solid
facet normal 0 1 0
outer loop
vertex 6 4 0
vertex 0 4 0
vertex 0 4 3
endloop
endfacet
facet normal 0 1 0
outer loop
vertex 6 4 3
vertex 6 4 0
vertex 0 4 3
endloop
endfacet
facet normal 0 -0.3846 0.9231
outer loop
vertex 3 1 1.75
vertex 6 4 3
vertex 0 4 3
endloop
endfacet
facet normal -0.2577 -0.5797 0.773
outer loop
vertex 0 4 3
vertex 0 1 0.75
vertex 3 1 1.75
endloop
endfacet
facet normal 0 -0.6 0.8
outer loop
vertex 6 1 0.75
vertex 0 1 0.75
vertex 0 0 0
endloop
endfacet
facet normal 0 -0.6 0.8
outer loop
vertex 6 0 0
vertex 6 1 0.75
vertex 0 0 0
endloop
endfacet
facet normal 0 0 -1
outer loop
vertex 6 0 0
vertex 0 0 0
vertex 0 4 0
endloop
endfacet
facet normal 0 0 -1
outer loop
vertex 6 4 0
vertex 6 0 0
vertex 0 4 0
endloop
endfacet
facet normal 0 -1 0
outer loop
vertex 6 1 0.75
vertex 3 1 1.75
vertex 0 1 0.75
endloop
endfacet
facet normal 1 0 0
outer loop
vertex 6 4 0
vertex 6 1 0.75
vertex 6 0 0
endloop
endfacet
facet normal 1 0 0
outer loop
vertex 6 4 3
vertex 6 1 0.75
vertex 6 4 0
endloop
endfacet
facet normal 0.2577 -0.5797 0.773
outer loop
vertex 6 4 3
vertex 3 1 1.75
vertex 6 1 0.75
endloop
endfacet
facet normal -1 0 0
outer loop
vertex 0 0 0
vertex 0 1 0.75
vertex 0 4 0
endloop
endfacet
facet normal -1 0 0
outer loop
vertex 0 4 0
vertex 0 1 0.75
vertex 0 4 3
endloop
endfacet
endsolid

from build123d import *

# Parameters (mm, degrees)
F1_DEPTH  = 6
F11_DEPTH = 6
F12_DEPTH = 25
F13_DEPTH = 25


with BuildPart() as f1:
    # F0 (on Right) → F1 (new body)
    with BuildSketch(Plane.YZ):
        Polygon((4, 3), (0, 0), (4, 0), align=None)
    extrude(amount=F1_DEPTH)

    # F10 (on face) → F11 (join)
    with BuildSketch(Plane.YZ.offset(6)):
        Polygon((1, 1.75), (1, 0.75), (4, 3), align=None)
    extrude(amount=-F11_DEPTH)

    # F9 (on 3pt) → F12 (cut)
    with BuildSketch(Plane(origin=(0.398340249, -0.8962655602, 1.1950207469), x_dir=(0.9662349396, 0.1545975903, -0.2061301204), z_dir=(-0.2576626506, 0.5797409638, -0.7729879517))):
        Polygon((5.7974096376, -1.25), (2.6925746984, -1.85), (5.7974096376, -5), align=None)
    extrude(amount=-F12_DEPTH, mode=Mode.SUBTRACT)

    # F7 (on 3pt) → F13 (cut)
    with BuildSketch(Plane(origin=(0, 0, 0), x_dir=(0.9662349396, -0.1545975903, 0.2061301204), z_dir=(-0.2576626506, -0.5797409638, 0.7729879517))):
        Polygon((3.1048349393, 1.85), (0, 5), (0, 1.25), align=None)
    extrude(amount=F13_DEPTH, mode=Mode.SUBTRACT)


solid = f1.part
